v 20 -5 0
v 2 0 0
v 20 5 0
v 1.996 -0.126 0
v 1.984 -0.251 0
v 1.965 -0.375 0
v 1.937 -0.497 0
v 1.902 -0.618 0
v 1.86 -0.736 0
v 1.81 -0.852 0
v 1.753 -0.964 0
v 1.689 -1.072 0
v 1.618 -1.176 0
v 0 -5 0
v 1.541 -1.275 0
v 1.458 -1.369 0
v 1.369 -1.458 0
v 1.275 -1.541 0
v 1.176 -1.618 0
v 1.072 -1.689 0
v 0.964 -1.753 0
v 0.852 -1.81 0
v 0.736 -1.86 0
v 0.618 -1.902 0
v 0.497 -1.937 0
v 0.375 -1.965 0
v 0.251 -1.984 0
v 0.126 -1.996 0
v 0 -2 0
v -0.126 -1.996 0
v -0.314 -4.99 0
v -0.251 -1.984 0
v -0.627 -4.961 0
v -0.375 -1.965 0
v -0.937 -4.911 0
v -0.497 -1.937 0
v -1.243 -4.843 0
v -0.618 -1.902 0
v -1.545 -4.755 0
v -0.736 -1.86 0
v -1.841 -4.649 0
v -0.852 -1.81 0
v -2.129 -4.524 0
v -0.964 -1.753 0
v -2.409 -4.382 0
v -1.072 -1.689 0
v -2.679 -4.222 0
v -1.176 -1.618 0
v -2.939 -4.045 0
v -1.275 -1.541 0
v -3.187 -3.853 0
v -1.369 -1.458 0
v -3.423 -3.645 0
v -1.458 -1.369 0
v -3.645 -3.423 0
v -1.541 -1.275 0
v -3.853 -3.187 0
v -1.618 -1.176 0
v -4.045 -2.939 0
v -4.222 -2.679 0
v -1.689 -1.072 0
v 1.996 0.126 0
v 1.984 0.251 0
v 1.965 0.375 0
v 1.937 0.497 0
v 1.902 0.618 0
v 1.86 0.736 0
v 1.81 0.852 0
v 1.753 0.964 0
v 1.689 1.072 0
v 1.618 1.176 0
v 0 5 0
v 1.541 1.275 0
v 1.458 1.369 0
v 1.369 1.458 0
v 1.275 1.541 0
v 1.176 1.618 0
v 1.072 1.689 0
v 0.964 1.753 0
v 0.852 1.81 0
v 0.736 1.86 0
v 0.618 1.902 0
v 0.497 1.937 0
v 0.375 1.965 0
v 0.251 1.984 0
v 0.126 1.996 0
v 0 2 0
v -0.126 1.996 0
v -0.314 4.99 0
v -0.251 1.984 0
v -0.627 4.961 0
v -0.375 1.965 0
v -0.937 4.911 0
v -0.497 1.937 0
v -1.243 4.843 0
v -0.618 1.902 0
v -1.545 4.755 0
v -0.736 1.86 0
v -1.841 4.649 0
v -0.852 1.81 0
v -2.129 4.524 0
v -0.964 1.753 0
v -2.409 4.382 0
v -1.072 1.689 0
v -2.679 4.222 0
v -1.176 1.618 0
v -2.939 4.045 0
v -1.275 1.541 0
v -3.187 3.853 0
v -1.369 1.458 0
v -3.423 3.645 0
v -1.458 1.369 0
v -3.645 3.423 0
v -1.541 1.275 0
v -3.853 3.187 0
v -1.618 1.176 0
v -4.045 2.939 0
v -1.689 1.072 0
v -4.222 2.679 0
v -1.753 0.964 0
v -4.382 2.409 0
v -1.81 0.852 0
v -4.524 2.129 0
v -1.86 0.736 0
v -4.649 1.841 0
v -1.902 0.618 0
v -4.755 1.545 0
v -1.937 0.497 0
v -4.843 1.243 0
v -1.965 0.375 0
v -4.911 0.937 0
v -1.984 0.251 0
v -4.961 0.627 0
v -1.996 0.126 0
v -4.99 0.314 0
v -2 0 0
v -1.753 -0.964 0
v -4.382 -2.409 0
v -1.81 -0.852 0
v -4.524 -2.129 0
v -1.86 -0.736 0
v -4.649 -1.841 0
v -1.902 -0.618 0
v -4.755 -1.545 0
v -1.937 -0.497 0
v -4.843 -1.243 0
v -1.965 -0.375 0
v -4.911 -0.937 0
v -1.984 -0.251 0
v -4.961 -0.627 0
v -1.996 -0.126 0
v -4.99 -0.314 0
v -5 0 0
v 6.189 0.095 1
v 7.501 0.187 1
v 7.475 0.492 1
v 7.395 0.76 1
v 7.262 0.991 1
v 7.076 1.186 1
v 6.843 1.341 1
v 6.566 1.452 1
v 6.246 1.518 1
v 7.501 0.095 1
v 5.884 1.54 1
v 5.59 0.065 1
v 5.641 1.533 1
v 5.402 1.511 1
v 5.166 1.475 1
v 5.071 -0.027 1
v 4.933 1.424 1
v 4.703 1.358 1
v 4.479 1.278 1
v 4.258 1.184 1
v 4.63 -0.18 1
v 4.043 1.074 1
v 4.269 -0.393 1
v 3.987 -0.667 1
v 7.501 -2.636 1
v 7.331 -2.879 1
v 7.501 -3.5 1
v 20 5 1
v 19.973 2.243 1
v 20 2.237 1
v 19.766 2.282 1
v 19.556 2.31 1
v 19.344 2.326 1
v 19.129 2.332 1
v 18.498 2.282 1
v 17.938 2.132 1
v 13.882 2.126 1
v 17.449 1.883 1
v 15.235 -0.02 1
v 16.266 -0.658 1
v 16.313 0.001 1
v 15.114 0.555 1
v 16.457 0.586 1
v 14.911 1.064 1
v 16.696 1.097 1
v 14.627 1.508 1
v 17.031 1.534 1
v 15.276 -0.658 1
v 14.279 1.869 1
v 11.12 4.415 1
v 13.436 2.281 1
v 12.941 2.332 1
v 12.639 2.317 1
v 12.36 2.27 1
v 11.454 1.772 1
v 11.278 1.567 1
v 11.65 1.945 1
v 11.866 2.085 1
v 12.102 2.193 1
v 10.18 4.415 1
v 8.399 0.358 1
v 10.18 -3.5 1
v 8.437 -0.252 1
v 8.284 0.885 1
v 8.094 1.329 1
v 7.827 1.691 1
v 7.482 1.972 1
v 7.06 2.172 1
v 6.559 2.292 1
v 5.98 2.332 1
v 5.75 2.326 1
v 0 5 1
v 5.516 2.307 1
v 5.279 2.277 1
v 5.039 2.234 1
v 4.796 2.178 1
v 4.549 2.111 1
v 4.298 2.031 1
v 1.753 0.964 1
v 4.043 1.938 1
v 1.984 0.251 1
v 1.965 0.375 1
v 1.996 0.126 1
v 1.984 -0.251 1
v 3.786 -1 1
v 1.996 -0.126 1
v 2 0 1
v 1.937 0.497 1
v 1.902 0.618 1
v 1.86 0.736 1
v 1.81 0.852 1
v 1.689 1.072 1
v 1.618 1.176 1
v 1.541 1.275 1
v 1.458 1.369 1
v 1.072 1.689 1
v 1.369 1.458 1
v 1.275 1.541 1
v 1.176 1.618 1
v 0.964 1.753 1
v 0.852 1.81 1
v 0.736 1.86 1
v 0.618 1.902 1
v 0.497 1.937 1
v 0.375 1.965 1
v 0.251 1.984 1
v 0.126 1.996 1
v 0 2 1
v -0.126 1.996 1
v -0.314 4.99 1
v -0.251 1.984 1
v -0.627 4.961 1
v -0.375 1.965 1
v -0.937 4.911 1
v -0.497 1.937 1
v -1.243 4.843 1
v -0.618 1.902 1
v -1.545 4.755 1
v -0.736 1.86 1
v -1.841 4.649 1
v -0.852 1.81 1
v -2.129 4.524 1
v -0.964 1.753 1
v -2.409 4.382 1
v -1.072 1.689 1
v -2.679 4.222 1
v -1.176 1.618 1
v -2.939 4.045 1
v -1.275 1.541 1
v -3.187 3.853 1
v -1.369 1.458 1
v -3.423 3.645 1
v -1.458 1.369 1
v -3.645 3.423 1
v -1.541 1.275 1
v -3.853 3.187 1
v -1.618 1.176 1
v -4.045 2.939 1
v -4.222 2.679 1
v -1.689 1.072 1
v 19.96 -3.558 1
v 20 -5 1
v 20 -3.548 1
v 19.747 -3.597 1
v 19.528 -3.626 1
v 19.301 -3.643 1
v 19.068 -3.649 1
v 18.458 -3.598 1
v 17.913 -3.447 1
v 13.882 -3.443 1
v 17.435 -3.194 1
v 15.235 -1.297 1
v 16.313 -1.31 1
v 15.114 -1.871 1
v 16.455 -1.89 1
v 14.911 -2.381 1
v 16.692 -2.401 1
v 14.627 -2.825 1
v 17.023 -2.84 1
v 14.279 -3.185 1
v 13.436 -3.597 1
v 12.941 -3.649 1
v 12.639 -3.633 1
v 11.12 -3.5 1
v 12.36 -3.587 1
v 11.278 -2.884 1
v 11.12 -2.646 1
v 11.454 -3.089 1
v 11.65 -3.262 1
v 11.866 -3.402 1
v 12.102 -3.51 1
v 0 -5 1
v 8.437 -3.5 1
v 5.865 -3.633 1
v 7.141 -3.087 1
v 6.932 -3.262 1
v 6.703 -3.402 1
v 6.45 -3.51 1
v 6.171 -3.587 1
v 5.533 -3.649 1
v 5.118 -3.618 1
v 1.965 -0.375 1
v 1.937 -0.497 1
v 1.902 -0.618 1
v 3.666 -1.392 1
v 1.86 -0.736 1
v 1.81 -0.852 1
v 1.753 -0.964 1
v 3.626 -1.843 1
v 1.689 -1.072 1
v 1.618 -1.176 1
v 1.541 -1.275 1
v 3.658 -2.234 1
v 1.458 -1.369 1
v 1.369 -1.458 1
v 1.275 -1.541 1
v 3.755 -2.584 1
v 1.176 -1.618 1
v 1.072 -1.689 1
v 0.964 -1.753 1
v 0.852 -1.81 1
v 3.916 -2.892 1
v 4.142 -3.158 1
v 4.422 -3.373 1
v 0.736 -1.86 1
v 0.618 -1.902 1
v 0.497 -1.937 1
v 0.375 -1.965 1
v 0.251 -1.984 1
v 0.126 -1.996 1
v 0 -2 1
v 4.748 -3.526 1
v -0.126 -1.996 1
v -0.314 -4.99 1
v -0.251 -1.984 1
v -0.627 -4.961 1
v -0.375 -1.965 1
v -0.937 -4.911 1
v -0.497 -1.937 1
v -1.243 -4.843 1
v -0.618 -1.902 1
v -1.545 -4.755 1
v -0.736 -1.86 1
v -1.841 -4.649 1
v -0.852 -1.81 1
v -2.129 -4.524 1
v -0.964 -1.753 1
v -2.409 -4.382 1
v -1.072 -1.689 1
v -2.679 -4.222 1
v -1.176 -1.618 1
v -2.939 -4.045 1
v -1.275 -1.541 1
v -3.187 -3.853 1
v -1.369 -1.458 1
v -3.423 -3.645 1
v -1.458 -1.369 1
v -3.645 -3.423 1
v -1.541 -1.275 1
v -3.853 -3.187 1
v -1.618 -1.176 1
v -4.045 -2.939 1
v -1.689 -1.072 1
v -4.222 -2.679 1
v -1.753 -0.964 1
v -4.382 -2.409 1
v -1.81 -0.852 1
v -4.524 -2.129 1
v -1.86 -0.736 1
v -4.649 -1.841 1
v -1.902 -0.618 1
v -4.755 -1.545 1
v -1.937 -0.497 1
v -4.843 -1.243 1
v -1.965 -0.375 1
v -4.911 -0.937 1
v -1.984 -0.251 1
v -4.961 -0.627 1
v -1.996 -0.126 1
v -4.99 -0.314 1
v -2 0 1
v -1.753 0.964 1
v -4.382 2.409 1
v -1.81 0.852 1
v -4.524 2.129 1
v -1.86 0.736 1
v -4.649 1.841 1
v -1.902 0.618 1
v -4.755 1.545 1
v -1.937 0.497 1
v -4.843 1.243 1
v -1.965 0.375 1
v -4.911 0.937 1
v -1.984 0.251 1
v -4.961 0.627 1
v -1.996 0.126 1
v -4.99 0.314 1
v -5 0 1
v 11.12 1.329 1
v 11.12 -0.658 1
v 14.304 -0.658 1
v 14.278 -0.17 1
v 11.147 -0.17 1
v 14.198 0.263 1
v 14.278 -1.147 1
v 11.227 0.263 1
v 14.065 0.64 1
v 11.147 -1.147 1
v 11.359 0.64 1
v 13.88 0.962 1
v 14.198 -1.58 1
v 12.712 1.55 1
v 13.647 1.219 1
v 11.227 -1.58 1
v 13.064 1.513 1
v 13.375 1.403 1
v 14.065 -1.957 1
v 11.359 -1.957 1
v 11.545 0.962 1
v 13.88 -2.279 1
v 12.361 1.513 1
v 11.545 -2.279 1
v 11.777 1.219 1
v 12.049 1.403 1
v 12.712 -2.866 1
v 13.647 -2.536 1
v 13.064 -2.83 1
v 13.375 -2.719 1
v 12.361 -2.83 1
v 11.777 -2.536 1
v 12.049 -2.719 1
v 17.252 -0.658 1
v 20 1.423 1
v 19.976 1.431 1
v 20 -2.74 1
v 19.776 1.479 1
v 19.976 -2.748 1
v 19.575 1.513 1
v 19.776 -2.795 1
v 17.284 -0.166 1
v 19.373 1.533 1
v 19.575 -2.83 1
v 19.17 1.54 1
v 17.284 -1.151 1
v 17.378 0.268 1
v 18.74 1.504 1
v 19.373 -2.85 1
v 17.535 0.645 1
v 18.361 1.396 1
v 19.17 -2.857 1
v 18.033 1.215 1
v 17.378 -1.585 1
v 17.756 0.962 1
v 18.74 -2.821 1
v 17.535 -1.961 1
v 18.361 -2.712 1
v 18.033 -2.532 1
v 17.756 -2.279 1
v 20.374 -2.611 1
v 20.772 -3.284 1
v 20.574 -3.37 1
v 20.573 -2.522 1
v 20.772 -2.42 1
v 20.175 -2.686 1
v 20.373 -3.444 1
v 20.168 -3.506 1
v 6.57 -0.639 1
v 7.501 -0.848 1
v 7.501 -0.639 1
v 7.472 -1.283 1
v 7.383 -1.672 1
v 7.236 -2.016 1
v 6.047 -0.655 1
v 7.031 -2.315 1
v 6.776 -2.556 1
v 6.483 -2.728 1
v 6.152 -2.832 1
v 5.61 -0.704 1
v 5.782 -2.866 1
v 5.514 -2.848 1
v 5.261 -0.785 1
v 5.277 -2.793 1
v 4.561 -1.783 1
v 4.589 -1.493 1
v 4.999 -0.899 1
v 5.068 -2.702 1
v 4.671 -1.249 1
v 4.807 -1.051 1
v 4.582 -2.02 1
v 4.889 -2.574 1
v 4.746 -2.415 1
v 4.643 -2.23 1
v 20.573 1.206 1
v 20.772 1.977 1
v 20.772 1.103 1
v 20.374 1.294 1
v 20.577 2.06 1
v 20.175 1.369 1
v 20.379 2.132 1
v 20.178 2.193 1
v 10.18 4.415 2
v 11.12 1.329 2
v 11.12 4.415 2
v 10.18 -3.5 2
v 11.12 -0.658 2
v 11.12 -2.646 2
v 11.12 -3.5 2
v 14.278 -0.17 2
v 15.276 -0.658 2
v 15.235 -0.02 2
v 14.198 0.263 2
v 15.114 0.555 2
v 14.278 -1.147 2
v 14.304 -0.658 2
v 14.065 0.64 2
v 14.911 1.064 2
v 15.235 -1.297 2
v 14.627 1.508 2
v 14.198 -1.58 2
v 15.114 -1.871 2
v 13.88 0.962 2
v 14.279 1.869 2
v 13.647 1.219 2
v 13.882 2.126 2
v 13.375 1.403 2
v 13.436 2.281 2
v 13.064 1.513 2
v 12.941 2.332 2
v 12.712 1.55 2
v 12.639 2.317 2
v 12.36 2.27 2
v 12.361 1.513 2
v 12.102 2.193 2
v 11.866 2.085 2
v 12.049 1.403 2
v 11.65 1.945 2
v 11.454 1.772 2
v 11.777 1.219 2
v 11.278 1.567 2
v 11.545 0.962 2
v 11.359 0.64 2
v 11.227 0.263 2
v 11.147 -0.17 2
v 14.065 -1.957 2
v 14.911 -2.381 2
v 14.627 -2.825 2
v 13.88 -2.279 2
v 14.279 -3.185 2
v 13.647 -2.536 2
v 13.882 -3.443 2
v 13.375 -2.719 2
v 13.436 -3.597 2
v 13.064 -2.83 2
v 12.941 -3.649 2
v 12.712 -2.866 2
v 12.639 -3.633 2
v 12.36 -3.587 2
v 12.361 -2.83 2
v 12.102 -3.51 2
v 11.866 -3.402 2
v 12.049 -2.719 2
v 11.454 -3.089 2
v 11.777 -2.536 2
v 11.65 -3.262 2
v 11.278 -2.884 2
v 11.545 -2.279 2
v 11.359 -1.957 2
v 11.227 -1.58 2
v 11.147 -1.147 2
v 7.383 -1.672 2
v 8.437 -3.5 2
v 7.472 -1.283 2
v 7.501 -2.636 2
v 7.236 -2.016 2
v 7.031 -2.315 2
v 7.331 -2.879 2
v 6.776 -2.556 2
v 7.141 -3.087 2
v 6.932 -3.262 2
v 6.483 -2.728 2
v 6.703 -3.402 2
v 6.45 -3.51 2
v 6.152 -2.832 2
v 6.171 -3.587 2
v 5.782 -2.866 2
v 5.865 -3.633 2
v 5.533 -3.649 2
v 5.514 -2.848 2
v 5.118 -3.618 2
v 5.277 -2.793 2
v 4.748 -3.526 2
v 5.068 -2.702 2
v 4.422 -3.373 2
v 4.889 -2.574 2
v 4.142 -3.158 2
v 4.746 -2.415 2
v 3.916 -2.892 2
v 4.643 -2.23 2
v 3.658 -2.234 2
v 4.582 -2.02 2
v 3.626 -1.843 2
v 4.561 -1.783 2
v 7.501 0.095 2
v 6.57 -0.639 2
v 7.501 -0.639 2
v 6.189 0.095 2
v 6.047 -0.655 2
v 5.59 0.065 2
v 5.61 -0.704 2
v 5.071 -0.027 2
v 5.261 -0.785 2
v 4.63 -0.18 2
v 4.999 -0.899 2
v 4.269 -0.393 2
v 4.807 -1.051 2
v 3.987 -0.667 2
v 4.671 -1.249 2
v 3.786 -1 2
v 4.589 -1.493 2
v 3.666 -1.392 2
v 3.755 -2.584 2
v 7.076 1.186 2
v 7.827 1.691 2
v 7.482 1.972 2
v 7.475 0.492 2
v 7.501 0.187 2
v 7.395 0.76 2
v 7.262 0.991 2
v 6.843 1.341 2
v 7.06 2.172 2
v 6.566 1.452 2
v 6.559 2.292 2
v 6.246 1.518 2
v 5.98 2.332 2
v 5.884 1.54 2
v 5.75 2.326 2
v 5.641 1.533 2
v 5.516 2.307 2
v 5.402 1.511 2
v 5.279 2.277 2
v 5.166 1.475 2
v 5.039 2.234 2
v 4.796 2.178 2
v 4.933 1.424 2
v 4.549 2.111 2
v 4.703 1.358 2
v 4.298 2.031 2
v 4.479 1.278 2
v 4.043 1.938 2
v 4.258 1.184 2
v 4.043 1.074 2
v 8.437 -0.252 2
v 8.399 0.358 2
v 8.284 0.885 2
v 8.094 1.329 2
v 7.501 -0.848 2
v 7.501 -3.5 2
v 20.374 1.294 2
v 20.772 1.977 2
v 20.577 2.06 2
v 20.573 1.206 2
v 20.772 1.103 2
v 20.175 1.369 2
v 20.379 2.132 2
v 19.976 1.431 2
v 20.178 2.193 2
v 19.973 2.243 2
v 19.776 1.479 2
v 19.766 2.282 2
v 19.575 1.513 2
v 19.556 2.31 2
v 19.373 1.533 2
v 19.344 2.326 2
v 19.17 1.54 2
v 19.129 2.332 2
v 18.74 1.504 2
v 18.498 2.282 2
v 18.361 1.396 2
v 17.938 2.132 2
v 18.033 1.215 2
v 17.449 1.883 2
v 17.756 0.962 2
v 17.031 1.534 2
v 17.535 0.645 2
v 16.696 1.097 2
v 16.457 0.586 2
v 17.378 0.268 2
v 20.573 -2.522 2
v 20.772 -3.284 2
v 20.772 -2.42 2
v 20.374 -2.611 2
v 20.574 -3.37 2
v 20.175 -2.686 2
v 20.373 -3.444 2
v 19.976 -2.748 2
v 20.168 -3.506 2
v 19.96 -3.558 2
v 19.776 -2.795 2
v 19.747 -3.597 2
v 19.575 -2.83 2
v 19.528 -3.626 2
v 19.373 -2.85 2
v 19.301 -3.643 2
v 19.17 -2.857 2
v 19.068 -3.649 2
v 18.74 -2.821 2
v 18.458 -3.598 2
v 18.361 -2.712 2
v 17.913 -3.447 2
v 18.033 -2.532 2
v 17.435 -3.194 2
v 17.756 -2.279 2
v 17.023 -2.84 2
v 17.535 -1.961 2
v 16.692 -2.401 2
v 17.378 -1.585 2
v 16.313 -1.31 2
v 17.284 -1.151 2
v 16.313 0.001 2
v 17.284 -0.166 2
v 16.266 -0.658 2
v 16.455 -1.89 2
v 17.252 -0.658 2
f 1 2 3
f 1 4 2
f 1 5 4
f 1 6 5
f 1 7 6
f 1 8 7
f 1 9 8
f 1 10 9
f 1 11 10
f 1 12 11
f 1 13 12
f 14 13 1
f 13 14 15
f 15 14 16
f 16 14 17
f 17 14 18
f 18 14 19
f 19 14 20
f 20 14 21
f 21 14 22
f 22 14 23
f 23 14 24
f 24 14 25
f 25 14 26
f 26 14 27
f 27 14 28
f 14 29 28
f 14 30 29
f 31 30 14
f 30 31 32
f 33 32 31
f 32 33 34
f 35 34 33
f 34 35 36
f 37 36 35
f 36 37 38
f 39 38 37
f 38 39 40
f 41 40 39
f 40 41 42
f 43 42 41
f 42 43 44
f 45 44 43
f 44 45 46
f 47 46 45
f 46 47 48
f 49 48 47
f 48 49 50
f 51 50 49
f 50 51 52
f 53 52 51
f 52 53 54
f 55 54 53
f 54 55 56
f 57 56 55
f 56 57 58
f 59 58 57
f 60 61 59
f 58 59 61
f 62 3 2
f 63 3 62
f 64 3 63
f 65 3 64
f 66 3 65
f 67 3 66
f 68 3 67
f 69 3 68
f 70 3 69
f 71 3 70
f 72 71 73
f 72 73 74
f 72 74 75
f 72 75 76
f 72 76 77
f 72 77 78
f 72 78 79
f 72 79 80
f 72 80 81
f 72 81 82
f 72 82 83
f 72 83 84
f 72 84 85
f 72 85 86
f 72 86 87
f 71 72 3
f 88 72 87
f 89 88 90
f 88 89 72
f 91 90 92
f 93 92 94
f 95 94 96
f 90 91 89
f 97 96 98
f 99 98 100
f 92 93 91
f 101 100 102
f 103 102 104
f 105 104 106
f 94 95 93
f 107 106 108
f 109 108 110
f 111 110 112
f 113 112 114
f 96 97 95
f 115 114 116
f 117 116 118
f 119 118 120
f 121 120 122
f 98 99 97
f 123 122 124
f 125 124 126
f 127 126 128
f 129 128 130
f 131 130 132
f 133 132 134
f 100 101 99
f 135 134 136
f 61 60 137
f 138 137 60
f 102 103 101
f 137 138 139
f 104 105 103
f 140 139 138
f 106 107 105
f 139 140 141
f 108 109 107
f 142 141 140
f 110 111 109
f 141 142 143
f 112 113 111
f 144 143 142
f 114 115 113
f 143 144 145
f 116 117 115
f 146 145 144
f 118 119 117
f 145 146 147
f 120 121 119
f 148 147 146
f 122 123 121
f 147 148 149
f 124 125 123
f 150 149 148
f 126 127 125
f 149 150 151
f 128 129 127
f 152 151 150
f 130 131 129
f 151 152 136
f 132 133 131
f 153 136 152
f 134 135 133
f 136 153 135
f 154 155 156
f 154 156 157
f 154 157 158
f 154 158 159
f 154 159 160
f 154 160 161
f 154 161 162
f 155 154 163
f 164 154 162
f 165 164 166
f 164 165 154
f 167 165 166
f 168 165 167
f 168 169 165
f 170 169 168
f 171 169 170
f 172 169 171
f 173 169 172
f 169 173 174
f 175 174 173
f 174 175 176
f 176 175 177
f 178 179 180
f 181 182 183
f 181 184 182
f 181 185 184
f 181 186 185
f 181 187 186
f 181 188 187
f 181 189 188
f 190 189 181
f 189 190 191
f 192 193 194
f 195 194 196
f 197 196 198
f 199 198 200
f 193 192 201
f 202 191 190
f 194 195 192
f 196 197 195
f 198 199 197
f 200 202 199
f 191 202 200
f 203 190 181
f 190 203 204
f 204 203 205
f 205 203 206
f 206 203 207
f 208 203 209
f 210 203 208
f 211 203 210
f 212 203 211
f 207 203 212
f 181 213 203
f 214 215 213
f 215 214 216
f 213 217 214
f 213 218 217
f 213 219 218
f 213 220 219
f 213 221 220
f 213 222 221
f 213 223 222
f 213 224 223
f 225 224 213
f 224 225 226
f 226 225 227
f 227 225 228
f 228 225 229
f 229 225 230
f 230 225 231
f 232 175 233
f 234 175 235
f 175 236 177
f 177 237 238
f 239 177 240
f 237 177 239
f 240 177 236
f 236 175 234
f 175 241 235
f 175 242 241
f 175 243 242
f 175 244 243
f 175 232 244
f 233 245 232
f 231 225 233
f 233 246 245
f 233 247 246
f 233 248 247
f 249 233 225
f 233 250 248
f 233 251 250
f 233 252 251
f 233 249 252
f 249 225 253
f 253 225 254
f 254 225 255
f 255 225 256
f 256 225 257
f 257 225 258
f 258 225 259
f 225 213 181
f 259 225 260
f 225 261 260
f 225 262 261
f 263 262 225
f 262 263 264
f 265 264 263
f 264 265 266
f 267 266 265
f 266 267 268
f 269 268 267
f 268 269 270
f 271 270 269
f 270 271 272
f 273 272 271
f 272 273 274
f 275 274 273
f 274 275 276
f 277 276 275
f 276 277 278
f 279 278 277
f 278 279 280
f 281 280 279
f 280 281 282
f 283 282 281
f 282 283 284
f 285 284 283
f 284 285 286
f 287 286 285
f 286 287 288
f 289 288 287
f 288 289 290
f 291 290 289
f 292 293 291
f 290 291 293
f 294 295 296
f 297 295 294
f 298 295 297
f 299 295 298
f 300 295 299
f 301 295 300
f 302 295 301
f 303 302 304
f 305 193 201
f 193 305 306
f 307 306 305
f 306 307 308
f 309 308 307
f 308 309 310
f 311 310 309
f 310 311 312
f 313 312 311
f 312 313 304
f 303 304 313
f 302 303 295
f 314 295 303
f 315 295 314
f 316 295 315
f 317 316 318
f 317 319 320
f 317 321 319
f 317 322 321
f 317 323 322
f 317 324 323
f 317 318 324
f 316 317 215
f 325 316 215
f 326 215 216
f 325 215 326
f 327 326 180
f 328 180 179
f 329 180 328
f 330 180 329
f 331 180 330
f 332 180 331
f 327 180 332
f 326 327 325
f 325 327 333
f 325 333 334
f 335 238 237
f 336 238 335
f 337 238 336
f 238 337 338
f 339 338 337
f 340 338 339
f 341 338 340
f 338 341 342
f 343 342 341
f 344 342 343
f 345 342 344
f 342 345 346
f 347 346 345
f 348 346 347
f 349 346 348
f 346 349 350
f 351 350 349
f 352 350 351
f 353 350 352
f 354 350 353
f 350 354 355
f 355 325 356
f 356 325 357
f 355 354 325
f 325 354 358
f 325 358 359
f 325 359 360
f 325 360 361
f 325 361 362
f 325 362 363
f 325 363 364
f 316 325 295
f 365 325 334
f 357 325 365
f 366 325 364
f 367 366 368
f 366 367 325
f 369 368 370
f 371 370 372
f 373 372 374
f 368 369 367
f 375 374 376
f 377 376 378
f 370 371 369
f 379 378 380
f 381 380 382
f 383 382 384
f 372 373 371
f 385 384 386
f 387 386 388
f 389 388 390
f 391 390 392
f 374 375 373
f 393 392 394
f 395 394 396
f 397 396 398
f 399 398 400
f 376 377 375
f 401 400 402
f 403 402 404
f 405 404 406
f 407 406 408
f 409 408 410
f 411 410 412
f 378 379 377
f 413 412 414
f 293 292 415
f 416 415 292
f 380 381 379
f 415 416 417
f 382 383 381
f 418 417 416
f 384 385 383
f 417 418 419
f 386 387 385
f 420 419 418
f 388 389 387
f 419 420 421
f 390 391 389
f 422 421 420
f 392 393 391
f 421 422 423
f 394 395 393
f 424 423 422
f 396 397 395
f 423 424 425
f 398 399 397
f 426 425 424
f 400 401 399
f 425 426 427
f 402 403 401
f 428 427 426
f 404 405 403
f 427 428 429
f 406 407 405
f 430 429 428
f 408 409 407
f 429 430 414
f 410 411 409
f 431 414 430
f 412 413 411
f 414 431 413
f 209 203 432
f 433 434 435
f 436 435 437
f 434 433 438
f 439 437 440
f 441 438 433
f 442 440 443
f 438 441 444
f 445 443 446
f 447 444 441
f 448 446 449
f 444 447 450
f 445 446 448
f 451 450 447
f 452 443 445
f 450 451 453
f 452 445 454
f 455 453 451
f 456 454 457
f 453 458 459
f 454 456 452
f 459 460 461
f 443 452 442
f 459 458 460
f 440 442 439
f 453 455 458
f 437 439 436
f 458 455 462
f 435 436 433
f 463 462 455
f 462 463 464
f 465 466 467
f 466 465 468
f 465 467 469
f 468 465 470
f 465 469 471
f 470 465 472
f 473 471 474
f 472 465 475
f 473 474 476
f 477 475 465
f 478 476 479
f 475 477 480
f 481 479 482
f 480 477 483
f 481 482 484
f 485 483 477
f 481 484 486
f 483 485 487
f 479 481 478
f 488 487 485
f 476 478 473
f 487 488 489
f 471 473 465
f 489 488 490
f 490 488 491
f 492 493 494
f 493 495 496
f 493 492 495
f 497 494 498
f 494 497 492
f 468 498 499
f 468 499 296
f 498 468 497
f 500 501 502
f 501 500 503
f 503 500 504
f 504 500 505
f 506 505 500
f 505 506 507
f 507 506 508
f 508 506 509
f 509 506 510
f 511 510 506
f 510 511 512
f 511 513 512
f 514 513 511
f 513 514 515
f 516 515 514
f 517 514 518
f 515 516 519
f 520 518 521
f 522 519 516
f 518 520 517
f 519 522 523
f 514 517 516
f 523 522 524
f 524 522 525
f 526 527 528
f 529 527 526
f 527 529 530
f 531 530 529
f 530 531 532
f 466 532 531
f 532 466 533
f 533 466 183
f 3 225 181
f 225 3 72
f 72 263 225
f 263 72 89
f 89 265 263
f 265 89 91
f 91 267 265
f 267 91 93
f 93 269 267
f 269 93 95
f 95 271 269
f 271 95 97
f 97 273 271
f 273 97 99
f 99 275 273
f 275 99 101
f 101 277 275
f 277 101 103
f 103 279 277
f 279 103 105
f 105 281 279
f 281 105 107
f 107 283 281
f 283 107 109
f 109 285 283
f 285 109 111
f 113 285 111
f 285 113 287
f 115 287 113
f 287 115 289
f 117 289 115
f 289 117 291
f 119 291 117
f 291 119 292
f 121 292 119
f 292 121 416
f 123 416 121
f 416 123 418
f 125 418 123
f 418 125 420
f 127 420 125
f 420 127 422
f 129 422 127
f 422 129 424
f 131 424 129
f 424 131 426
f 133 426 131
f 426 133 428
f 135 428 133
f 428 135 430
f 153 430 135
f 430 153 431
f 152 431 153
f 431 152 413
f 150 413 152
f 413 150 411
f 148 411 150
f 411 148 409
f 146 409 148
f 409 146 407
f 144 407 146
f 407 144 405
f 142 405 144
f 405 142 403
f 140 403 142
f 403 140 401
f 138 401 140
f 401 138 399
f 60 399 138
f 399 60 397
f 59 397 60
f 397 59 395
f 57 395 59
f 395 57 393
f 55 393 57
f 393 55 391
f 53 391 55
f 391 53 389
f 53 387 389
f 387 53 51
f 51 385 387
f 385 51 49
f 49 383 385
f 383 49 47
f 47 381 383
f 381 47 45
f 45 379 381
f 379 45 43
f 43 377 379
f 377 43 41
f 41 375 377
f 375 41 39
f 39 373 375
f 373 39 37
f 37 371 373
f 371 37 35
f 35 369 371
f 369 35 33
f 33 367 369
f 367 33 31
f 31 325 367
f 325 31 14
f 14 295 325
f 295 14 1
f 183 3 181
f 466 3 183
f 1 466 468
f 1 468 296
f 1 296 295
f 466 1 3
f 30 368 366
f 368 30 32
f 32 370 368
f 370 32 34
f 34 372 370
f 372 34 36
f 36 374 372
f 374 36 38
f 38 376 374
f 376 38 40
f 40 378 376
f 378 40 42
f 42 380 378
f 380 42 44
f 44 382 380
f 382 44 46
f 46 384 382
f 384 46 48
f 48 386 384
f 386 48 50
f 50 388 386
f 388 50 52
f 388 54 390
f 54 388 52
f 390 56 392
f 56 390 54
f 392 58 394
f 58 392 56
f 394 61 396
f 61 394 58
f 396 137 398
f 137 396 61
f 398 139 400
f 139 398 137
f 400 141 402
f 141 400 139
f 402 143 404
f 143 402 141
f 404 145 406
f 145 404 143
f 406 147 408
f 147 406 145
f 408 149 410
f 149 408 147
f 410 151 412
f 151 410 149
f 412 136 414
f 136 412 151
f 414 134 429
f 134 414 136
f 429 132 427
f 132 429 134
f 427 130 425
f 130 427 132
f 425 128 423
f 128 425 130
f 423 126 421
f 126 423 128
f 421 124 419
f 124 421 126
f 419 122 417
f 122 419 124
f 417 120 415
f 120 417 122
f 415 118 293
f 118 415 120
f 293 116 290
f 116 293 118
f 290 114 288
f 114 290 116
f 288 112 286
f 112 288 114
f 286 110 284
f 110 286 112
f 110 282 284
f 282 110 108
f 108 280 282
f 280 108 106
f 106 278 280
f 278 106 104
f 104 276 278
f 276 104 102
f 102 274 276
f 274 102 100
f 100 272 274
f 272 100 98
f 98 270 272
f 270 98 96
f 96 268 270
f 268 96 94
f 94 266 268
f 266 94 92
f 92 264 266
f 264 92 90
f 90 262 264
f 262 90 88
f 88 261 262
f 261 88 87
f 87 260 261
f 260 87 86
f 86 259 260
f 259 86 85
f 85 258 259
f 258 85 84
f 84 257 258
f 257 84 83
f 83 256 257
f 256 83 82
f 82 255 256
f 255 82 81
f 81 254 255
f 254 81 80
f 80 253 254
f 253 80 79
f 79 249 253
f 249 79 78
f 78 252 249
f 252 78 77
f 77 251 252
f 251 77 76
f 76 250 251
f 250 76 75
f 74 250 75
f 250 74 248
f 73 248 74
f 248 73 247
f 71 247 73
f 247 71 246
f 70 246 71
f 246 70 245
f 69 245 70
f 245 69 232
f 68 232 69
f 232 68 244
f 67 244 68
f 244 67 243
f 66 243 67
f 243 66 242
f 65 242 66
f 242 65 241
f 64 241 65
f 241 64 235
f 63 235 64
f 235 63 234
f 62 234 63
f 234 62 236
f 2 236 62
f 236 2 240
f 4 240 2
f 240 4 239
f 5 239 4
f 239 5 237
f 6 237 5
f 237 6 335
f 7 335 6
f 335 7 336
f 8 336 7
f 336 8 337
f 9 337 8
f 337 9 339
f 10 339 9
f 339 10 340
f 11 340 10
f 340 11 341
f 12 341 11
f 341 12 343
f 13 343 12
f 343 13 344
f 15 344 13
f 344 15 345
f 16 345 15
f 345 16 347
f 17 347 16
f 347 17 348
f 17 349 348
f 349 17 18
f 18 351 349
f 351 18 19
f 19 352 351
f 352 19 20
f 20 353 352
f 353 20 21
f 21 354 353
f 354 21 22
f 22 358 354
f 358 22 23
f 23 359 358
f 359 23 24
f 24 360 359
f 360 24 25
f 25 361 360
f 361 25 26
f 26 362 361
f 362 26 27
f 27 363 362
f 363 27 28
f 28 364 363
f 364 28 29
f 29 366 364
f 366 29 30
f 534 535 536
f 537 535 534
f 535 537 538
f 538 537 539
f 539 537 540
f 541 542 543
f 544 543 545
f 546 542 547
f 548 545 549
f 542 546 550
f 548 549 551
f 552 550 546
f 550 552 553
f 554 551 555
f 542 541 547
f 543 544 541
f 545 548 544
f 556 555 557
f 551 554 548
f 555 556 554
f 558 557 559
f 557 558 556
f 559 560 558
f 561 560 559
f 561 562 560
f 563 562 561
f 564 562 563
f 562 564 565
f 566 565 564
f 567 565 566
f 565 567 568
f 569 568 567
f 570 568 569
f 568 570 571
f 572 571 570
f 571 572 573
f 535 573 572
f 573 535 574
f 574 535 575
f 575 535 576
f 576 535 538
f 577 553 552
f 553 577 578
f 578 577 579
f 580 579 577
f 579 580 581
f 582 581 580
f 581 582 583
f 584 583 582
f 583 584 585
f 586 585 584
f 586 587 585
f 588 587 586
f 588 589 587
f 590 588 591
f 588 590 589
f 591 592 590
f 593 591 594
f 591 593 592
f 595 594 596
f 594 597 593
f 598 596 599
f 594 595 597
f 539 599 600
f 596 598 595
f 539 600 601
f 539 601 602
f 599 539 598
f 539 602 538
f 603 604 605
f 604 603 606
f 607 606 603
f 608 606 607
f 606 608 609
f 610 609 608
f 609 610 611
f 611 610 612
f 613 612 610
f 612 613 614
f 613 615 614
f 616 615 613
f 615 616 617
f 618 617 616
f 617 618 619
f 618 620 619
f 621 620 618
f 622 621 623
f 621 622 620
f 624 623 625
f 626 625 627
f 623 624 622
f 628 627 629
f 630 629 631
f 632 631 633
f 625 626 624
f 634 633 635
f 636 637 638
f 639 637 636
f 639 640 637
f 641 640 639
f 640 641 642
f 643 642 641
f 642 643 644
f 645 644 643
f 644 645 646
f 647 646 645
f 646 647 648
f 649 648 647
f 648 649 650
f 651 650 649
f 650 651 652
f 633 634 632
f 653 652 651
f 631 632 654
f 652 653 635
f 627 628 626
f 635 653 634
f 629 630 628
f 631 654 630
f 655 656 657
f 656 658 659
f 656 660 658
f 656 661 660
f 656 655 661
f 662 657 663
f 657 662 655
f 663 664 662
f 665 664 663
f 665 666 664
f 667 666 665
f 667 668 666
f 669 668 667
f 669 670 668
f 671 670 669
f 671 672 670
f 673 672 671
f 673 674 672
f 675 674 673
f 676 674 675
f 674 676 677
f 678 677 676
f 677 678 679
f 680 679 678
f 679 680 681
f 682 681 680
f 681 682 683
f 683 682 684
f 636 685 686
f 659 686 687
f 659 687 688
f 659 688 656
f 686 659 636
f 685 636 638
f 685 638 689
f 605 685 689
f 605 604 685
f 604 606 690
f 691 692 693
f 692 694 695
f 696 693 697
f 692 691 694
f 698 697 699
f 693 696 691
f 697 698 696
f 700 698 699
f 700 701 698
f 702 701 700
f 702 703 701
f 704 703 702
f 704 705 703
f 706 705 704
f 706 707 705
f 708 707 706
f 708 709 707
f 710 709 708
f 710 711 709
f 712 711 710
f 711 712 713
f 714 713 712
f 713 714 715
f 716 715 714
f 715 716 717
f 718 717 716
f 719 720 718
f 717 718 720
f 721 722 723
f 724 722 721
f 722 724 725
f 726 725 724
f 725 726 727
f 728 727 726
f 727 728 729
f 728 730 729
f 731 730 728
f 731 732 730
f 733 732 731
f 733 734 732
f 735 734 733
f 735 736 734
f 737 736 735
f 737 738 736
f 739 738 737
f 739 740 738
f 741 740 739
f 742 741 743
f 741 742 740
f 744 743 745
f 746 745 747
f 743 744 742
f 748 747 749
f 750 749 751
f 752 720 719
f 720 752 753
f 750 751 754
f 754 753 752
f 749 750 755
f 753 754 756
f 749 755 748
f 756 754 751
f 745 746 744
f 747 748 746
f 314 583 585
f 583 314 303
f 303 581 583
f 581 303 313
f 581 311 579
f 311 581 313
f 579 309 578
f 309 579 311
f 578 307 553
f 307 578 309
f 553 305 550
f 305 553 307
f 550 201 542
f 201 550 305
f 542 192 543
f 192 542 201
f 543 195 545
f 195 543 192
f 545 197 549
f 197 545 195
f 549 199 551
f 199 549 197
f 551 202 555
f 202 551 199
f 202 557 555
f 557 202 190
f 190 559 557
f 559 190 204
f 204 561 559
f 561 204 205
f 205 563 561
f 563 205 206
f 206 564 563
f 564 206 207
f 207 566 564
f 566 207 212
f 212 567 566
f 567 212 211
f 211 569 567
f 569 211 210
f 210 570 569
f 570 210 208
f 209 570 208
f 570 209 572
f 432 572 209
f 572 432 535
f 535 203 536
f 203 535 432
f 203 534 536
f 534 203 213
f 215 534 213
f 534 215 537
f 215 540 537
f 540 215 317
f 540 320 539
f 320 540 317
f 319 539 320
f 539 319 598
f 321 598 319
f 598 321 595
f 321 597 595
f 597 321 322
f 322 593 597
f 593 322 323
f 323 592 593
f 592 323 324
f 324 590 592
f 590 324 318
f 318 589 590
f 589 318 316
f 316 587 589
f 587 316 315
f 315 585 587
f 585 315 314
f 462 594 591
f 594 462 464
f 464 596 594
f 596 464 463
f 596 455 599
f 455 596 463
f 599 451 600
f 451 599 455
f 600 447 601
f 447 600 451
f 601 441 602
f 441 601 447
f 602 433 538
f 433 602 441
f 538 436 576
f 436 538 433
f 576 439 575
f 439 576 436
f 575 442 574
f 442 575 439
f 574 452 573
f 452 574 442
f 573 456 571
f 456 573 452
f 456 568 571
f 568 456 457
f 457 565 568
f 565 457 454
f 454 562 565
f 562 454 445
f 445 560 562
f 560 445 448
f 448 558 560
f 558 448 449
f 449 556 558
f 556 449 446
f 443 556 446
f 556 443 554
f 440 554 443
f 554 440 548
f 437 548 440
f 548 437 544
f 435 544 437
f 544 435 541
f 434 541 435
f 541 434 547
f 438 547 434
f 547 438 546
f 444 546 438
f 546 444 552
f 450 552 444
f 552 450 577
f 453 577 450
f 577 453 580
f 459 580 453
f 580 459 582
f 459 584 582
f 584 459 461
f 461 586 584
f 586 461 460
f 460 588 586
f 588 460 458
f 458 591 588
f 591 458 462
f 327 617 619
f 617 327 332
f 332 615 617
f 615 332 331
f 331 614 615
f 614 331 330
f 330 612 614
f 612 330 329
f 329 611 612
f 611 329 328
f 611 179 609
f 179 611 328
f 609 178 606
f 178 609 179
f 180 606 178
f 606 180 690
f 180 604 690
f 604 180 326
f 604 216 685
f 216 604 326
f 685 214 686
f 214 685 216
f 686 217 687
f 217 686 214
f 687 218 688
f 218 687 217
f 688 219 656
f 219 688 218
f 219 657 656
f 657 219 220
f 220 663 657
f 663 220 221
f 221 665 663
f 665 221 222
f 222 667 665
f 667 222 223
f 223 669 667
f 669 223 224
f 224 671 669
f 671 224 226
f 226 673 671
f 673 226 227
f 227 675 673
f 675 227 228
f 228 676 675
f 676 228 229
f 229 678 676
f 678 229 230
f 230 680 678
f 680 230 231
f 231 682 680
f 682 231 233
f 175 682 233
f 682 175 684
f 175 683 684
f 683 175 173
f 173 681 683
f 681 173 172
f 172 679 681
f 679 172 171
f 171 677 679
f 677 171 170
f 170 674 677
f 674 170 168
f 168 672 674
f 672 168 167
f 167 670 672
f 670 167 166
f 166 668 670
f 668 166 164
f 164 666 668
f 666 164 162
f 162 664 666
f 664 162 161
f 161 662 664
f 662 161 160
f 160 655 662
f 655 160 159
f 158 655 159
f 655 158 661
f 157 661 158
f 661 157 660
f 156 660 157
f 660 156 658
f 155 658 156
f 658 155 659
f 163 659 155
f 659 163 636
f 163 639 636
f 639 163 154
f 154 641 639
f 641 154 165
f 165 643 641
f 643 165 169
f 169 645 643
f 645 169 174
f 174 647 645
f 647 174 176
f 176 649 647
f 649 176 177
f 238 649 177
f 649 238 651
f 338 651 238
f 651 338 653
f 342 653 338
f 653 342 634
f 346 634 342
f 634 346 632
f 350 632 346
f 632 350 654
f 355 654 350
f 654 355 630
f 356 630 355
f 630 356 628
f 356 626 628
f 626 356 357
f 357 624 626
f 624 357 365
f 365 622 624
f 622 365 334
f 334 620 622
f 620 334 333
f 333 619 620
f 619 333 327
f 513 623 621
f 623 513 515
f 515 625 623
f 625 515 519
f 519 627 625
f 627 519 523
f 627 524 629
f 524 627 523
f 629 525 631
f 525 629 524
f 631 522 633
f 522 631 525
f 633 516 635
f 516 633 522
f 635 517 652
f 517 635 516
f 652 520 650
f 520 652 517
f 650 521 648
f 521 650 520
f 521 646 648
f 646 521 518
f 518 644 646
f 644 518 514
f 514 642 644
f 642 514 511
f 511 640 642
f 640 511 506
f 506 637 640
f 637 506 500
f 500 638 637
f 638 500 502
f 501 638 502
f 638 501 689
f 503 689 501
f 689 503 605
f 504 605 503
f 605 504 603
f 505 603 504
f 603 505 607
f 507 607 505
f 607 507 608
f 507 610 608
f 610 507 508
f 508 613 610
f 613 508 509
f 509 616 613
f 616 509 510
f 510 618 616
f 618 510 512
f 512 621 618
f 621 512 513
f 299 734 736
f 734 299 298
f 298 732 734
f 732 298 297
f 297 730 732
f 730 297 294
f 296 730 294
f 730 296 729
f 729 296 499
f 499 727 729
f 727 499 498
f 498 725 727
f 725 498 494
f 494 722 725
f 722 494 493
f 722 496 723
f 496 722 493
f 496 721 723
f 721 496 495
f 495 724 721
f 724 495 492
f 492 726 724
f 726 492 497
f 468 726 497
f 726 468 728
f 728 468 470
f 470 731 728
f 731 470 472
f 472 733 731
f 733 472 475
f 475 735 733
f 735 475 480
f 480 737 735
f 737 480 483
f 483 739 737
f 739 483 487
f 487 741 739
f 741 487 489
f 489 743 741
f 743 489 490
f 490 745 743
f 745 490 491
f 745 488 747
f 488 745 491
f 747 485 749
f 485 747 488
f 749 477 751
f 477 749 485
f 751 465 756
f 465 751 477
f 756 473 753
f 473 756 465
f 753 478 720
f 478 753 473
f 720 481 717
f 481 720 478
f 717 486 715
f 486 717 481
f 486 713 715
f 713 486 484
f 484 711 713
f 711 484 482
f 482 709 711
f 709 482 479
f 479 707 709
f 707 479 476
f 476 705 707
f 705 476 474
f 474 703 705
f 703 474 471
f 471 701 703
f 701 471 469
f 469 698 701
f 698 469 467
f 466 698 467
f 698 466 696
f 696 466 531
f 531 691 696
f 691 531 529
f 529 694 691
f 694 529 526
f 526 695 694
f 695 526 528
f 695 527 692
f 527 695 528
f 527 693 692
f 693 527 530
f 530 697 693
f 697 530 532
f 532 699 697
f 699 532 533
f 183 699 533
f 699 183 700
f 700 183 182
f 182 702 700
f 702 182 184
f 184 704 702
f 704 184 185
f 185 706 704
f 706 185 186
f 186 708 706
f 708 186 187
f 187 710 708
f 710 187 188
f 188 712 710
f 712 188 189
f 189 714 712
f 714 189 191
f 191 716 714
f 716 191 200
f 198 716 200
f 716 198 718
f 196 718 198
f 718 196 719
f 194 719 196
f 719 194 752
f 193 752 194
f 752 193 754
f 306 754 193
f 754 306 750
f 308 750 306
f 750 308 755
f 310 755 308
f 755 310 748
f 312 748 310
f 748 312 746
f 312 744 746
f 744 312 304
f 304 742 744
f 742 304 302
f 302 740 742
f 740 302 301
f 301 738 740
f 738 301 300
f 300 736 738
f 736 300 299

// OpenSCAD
//!OpenSCAD

// Note: Make it longer at a longer text
text2 = "abc";
font_thickness = 1;
font_size = 10;
hight = 1;
radius_of_hole = 2;
eges_of_hole = 100;
edges_of_rounding = 100;
// Lengh of your name tag
Lengh = 20;
// Width of your name tag
width = 10;
linear_extrude( height=hight, twist=0, scale=[1, 1], center=false){
  difference() {
    union(){
      {
        $fn=edges_of_rounding;    //set sides to edges_of_rounding
        circle(r=(width / 2));
      }
      translate([0, (width / -2), 0]){
        square([Lengh, width], center=false);
      }
    }

    {
      $fn=eges_of_hole;    //set sides to eges_of_hole
      circle(r=radius_of_hole);
    }
  }
}
translate([3, -3.5, hight]){
  // size is multiplied by 0.75 because openScad font sizes are in points, not pixels
  linear_extrude( height=font_thickness, twist=0, center=false){
    text(str(text2), font = "Roboto", size = font_size*0.75);
  }

}
